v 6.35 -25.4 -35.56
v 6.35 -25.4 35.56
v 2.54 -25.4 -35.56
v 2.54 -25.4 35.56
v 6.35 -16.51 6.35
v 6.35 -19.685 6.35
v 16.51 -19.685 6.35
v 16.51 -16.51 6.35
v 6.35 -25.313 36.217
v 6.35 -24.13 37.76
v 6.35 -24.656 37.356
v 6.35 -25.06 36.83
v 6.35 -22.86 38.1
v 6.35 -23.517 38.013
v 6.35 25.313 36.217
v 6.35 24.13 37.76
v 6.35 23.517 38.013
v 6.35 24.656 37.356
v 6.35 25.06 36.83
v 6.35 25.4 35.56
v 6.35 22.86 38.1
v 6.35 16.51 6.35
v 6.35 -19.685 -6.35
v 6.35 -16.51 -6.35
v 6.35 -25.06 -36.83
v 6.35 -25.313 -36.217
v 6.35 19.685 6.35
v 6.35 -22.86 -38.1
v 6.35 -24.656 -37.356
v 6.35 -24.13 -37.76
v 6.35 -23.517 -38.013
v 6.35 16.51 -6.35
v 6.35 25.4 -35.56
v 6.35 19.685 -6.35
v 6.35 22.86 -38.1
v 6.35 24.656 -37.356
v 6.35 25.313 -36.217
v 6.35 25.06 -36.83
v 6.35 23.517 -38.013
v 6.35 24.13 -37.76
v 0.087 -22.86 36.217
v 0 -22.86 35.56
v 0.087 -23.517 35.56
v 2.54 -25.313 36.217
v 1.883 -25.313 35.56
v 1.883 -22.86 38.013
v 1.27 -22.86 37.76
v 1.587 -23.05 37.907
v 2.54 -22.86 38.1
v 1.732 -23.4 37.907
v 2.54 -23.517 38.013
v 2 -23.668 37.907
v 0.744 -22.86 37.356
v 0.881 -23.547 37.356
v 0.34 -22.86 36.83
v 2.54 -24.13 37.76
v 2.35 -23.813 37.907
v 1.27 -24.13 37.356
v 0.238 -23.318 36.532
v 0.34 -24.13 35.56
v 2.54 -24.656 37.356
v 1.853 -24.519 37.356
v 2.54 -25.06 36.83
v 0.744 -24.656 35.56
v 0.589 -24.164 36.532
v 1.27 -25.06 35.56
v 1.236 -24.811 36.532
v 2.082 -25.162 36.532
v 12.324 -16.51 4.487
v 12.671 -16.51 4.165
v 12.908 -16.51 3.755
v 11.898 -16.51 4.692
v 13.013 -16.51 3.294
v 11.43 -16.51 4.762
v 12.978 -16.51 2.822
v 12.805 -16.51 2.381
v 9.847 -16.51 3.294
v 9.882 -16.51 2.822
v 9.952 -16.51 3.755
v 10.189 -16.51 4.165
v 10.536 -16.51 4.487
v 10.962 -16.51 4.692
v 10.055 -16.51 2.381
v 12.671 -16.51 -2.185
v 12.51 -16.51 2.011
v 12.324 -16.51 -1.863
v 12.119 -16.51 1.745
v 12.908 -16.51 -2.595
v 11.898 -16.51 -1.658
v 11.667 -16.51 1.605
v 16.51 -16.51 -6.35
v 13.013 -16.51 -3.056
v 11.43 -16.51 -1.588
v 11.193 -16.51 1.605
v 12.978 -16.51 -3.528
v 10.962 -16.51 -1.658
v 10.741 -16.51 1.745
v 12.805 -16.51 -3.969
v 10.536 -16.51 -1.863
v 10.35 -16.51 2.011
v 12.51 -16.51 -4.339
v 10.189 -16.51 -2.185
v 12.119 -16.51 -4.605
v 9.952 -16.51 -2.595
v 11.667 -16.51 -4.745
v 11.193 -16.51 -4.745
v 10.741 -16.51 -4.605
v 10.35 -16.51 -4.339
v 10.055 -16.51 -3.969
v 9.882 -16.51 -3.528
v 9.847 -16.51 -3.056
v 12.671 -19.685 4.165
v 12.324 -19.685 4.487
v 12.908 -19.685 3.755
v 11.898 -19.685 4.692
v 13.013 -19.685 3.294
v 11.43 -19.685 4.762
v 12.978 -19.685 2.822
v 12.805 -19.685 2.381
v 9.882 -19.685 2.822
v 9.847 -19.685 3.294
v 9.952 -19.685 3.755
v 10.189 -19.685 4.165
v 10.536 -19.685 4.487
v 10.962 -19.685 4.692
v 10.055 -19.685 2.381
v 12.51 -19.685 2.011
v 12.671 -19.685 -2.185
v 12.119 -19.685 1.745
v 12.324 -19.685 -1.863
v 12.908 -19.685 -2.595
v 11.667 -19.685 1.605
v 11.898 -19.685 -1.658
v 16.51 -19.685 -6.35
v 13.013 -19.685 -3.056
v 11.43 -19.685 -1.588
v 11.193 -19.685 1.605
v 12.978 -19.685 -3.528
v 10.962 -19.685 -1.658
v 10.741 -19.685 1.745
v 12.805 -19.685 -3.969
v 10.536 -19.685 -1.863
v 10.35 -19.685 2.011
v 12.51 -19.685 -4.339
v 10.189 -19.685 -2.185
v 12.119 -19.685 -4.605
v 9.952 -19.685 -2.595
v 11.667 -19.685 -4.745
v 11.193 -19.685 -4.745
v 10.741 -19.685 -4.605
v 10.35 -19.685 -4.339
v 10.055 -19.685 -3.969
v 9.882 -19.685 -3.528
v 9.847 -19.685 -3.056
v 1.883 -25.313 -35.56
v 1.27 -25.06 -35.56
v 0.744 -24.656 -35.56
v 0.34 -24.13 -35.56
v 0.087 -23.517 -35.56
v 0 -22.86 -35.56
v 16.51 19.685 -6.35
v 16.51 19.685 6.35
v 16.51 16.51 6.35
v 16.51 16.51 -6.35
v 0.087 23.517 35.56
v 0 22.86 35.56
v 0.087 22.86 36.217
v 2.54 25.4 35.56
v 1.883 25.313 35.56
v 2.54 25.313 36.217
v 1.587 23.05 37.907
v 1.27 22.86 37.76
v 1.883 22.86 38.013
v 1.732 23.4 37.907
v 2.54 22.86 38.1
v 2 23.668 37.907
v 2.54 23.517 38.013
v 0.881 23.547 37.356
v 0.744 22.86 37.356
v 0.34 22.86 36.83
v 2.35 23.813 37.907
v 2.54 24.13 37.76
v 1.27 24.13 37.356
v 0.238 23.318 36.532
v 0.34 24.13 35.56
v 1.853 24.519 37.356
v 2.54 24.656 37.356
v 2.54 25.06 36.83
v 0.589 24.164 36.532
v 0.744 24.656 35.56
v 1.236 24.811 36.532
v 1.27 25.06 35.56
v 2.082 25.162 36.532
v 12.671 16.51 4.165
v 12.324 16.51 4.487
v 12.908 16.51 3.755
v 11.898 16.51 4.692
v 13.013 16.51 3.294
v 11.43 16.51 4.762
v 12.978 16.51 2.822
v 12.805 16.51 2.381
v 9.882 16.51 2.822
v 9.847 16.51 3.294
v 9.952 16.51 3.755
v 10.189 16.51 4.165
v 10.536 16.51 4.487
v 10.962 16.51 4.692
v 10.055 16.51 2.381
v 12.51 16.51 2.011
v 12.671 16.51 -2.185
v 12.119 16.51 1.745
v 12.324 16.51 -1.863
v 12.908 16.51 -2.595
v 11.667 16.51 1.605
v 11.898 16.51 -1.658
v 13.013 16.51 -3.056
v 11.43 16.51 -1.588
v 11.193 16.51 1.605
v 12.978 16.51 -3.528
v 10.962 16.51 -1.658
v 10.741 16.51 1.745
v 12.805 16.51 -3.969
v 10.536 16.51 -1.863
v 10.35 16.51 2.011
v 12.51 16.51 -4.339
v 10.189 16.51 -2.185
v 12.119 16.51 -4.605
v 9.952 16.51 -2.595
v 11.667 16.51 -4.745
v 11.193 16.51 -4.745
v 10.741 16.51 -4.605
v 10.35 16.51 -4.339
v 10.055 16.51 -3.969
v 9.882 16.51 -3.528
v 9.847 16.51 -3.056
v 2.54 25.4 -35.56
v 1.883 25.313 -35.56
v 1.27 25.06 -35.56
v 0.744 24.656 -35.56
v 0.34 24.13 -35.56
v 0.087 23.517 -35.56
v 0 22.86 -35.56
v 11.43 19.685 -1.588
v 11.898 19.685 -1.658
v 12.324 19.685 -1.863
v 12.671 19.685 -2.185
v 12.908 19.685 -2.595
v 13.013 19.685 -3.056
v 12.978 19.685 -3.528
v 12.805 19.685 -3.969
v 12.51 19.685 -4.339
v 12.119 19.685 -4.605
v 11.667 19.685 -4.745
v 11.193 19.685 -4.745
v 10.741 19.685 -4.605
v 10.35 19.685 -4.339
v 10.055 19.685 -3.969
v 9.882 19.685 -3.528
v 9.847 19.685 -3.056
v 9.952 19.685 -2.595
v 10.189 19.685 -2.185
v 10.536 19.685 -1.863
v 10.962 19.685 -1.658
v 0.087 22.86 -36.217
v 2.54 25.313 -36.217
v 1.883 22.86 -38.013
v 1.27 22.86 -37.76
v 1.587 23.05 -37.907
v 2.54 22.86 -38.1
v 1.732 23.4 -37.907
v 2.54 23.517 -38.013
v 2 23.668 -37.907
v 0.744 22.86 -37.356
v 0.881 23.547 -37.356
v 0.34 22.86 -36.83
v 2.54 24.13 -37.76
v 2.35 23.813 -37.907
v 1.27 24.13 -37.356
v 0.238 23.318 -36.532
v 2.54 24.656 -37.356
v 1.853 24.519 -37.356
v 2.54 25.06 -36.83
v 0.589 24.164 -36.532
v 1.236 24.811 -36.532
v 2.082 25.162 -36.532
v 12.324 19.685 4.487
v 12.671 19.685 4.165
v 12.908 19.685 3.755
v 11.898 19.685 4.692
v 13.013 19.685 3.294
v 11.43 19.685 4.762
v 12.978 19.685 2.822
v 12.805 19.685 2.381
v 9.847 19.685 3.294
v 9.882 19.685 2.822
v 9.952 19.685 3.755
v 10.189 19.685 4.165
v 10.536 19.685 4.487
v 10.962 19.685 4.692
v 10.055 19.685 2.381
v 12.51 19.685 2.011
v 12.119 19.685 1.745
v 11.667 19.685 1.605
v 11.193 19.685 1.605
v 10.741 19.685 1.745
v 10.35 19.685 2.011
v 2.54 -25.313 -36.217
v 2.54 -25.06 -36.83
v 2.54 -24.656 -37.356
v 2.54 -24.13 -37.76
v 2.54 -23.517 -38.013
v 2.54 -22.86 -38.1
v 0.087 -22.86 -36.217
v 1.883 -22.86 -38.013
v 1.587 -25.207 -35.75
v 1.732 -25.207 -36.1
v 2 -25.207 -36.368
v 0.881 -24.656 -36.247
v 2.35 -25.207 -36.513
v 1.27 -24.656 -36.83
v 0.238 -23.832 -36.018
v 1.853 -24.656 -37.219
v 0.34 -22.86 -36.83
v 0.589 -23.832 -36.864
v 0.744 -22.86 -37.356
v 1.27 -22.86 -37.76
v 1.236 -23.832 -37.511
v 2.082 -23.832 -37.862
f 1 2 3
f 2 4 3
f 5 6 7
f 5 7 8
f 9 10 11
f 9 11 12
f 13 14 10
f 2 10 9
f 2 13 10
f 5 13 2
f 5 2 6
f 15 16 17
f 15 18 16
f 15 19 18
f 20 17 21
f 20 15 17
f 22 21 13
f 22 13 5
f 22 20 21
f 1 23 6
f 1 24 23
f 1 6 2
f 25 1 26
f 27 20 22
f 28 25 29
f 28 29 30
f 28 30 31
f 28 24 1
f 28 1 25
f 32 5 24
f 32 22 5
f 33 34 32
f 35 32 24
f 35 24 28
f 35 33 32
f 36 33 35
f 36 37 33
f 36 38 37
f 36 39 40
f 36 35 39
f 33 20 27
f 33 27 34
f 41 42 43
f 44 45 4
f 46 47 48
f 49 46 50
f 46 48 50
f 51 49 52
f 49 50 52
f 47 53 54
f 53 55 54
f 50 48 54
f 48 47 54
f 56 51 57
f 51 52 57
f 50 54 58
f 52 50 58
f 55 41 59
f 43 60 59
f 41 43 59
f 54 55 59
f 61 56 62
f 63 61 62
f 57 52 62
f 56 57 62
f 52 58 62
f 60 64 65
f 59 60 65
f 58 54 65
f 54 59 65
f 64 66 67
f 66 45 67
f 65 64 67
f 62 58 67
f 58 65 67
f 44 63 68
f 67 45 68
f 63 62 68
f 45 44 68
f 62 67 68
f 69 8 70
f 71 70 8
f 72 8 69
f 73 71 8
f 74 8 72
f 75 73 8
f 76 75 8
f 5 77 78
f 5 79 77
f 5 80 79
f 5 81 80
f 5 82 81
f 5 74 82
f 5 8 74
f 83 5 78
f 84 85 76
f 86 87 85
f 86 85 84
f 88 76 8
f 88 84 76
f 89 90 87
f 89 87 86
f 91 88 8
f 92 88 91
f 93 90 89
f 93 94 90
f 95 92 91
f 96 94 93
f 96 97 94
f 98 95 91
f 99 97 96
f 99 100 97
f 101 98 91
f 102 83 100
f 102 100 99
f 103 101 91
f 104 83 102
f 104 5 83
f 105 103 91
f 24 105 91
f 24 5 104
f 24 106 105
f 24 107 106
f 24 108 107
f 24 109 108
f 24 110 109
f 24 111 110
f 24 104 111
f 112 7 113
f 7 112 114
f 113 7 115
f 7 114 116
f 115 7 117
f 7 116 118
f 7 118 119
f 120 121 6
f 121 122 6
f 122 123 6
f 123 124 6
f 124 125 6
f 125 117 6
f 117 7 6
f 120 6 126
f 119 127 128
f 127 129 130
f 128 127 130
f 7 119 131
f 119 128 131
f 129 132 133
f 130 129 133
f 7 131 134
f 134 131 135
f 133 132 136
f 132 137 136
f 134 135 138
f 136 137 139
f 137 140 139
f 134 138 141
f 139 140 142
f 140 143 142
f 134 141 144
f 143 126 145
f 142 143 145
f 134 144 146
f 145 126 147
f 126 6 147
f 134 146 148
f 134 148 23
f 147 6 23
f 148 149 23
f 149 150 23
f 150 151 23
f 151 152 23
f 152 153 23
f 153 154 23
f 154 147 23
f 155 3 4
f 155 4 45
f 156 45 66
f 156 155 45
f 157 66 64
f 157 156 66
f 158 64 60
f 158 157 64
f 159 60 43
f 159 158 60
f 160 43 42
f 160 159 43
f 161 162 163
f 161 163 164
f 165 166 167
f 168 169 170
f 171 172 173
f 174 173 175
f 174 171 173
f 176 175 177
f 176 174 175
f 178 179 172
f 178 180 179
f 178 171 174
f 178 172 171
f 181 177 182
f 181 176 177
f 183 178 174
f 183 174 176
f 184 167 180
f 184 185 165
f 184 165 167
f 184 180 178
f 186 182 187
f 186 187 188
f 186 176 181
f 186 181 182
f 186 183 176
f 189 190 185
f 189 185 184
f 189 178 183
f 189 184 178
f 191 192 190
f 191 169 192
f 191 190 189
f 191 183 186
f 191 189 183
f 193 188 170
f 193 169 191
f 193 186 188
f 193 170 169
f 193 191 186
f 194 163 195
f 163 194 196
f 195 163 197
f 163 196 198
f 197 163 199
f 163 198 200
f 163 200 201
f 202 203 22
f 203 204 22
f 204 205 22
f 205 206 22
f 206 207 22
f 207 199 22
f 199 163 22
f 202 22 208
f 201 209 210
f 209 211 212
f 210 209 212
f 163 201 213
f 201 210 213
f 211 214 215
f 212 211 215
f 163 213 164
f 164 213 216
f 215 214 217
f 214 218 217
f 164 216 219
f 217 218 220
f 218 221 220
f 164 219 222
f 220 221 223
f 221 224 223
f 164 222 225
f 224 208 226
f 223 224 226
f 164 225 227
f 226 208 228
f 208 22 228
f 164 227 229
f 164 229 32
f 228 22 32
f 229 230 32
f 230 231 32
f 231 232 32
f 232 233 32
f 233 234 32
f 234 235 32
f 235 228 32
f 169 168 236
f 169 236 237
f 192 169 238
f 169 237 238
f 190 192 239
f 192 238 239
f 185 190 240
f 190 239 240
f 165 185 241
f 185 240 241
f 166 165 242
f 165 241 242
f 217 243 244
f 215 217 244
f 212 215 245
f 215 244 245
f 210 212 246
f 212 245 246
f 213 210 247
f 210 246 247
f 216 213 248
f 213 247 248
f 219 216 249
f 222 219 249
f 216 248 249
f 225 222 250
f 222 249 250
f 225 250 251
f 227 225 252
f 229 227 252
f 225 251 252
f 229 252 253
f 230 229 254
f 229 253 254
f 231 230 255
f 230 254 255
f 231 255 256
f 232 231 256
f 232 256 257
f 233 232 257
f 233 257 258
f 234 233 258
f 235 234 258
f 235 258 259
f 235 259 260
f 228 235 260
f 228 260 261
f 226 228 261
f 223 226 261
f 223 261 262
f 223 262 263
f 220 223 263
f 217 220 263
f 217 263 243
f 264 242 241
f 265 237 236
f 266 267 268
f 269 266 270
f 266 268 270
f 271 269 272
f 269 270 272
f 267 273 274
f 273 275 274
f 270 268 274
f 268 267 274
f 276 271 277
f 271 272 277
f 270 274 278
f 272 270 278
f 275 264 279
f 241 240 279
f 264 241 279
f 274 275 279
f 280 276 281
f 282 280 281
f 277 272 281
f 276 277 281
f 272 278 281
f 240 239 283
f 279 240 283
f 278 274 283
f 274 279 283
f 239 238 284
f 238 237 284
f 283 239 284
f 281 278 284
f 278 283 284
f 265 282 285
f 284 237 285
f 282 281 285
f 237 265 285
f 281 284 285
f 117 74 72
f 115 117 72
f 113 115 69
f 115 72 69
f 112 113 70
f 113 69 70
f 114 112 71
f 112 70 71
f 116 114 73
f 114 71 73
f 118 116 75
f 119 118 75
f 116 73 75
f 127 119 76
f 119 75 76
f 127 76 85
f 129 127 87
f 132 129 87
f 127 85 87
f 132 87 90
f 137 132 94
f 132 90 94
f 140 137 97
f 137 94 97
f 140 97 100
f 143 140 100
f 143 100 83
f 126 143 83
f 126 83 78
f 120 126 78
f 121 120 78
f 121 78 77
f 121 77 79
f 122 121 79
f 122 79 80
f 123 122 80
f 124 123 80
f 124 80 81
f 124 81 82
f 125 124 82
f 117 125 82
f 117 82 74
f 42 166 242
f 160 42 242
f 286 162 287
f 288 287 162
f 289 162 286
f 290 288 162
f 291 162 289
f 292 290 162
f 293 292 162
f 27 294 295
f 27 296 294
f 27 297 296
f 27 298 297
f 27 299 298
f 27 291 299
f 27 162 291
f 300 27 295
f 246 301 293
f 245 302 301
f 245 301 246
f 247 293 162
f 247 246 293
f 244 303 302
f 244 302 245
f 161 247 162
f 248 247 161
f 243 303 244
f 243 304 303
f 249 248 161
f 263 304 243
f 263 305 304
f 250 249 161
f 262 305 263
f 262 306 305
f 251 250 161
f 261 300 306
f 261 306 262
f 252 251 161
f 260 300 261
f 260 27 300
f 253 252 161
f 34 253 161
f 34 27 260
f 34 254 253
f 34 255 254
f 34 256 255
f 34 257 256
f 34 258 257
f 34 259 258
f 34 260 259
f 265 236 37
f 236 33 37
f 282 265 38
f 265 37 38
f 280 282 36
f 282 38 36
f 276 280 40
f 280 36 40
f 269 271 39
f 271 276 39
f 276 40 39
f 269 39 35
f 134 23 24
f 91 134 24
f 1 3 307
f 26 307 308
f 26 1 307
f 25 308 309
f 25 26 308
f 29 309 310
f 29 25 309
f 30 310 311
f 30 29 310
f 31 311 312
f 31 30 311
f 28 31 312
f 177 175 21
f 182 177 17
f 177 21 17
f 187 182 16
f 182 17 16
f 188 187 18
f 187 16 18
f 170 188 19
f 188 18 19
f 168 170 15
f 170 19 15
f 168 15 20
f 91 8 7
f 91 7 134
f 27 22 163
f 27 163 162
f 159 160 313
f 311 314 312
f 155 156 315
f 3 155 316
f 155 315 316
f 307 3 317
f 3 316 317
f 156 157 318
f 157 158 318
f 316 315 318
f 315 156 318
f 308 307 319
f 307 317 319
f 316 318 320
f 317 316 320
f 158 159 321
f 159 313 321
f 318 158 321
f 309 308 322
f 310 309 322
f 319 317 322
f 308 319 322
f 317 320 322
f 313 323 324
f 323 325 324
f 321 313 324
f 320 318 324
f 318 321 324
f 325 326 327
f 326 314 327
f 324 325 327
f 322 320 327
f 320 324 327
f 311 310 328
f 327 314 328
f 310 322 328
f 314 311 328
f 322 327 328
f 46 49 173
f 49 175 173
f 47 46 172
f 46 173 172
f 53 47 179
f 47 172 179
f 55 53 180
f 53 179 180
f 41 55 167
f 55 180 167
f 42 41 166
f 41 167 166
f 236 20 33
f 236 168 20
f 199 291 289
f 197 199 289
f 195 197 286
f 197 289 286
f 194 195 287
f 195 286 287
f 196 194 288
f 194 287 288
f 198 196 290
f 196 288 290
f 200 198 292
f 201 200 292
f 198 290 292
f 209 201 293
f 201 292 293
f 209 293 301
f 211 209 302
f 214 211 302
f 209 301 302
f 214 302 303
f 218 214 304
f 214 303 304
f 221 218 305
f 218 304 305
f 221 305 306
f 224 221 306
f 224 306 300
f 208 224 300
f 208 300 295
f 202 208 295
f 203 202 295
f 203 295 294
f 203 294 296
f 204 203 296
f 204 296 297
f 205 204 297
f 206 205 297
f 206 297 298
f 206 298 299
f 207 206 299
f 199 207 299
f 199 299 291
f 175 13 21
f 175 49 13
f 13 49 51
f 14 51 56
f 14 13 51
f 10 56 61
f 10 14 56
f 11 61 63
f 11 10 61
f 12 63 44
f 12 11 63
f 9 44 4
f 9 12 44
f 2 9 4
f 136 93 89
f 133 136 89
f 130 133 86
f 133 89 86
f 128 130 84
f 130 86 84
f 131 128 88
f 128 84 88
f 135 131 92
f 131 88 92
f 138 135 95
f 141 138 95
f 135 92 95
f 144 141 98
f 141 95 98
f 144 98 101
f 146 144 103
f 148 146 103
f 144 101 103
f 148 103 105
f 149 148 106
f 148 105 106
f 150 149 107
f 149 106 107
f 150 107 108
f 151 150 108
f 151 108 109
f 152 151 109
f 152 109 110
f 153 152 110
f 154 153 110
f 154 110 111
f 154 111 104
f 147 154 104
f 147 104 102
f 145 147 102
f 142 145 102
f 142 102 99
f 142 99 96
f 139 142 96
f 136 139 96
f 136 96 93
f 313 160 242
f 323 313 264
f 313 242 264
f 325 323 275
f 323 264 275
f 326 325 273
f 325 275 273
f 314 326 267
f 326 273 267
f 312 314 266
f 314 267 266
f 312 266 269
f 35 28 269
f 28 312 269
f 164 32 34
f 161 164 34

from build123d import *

# Parameters (mm, degrees)
SKETCH1_W           = 76.2
SKETCH1_H           = 50.8
BOSS_EXTRUDE1_DEPTH = 6.35
SKETCH2_W           = 12.7
SKETCH2_H           = 3.175
BOSS_EXTRUDE2_DEPTH = 10.16
FILLET1_R           = 2.54
CUT_EXTRUDE1_REACH  = 63.293
SKETCH3_R           = 1.5875


with BuildPart() as part:
    # Sketch1 → Boss-Extrude1 (new body)
    with BuildSketch(Plane(origin=(0, 0, 0), x_dir=(0, 0, -1), z_dir=(1, 0, 0))):
        Rectangle(SKETCH1_W, SKETCH1_H)
    extrude(amount=BOSS_EXTRUDE1_DEPTH)

    # Sketch2 → Boss-Extrude2 (add)
    with BuildSketch(Plane(origin=(6.35, 0, 0), x_dir=(0, 0, -1), z_dir=(1, 0, 0))):
        with Locations((0, -18.0975)):
            Rectangle(SKETCH2_W, SKETCH2_H)
        with Locations((0, 18.0975)):
            Rectangle(SKETCH2_W, SKETCH2_H)
    extrude(amount=BOSS_EXTRUDE2_DEPTH)

    # Fillet1
    fillet1_edges = [part.edges().sort_by_distance(p)[0] for p in [
        (0, 25.4, 0),
        (0, 0, -38.1),
        (0, -25.4, 0),
        (0, 0, 38.1),
        (3.175, 25.4, 38.1),
        (3.175, 25.4, -38.1),
        (3.175, -25.4, -38.1),
        (3.175, -25.4, 38.1),
    ]]
    fillet(fillet1_edges, radius=FILLET1_R)

    # Cut-Extrude1: up to this face of the body (flat: up to its plane)
    cut_extrude1_end = Plane(part.part.faces().sort_by_distance((11.43, -19.685, 0))[0])
    # Sketch3 → Cut-Extrude1 (cut, up to the picked face)
    with BuildSketch(Plane(origin=(0, 19.685, 0), x_dir=(1, 0, 0), z_dir=(0, 1, 0)), mode=Mode.PRIVATE) as cut_extrude1_sk1:
        with Locations(Location((11.43, -3.175, 0), (0, 0, 270))):
            Circle(SKETCH3_R)
    cut_extrude1_tool1 = split(extrude(cut_extrude1_sk1.sketch, amount=-CUT_EXTRUDE1_REACH, mode=Mode.PRIVATE), bisect_by=cut_extrude1_end, keep=Keep.BOTH, mode=Mode.PRIVATE)
    # Sketch3 → Cut-Extrude1 (cut, up to the picked face)
    with BuildSketch(Plane(origin=(0, 19.685, 0), x_dir=(1, 0, 0), z_dir=(0, 1, 0)), mode=Mode.PRIVATE) as cut_extrude1_sk2:
        with Locations(Location((11.43, 3.175, 0), (0, 0, 270))):
            Circle(SKETCH3_R)
    cut_extrude1_tool2 = split(extrude(cut_extrude1_sk2.sketch, amount=-CUT_EXTRUDE1_REACH, mode=Mode.PRIVATE), bisect_by=cut_extrude1_end, keep=Keep.BOTH, mode=Mode.PRIVATE)
    add(cut_extrude1_tool1.solids().sort_by(Axis((11.43, 19.685, 3.175), (0, -1, 0)))[0], mode=Mode.SUBTRACT)
    add(cut_extrude1_tool2.solids().sort_by(Axis((11.43, 19.685, -3.175), (0, -1, 0)))[0], mode=Mode.SUBTRACT)


solid = part.part
